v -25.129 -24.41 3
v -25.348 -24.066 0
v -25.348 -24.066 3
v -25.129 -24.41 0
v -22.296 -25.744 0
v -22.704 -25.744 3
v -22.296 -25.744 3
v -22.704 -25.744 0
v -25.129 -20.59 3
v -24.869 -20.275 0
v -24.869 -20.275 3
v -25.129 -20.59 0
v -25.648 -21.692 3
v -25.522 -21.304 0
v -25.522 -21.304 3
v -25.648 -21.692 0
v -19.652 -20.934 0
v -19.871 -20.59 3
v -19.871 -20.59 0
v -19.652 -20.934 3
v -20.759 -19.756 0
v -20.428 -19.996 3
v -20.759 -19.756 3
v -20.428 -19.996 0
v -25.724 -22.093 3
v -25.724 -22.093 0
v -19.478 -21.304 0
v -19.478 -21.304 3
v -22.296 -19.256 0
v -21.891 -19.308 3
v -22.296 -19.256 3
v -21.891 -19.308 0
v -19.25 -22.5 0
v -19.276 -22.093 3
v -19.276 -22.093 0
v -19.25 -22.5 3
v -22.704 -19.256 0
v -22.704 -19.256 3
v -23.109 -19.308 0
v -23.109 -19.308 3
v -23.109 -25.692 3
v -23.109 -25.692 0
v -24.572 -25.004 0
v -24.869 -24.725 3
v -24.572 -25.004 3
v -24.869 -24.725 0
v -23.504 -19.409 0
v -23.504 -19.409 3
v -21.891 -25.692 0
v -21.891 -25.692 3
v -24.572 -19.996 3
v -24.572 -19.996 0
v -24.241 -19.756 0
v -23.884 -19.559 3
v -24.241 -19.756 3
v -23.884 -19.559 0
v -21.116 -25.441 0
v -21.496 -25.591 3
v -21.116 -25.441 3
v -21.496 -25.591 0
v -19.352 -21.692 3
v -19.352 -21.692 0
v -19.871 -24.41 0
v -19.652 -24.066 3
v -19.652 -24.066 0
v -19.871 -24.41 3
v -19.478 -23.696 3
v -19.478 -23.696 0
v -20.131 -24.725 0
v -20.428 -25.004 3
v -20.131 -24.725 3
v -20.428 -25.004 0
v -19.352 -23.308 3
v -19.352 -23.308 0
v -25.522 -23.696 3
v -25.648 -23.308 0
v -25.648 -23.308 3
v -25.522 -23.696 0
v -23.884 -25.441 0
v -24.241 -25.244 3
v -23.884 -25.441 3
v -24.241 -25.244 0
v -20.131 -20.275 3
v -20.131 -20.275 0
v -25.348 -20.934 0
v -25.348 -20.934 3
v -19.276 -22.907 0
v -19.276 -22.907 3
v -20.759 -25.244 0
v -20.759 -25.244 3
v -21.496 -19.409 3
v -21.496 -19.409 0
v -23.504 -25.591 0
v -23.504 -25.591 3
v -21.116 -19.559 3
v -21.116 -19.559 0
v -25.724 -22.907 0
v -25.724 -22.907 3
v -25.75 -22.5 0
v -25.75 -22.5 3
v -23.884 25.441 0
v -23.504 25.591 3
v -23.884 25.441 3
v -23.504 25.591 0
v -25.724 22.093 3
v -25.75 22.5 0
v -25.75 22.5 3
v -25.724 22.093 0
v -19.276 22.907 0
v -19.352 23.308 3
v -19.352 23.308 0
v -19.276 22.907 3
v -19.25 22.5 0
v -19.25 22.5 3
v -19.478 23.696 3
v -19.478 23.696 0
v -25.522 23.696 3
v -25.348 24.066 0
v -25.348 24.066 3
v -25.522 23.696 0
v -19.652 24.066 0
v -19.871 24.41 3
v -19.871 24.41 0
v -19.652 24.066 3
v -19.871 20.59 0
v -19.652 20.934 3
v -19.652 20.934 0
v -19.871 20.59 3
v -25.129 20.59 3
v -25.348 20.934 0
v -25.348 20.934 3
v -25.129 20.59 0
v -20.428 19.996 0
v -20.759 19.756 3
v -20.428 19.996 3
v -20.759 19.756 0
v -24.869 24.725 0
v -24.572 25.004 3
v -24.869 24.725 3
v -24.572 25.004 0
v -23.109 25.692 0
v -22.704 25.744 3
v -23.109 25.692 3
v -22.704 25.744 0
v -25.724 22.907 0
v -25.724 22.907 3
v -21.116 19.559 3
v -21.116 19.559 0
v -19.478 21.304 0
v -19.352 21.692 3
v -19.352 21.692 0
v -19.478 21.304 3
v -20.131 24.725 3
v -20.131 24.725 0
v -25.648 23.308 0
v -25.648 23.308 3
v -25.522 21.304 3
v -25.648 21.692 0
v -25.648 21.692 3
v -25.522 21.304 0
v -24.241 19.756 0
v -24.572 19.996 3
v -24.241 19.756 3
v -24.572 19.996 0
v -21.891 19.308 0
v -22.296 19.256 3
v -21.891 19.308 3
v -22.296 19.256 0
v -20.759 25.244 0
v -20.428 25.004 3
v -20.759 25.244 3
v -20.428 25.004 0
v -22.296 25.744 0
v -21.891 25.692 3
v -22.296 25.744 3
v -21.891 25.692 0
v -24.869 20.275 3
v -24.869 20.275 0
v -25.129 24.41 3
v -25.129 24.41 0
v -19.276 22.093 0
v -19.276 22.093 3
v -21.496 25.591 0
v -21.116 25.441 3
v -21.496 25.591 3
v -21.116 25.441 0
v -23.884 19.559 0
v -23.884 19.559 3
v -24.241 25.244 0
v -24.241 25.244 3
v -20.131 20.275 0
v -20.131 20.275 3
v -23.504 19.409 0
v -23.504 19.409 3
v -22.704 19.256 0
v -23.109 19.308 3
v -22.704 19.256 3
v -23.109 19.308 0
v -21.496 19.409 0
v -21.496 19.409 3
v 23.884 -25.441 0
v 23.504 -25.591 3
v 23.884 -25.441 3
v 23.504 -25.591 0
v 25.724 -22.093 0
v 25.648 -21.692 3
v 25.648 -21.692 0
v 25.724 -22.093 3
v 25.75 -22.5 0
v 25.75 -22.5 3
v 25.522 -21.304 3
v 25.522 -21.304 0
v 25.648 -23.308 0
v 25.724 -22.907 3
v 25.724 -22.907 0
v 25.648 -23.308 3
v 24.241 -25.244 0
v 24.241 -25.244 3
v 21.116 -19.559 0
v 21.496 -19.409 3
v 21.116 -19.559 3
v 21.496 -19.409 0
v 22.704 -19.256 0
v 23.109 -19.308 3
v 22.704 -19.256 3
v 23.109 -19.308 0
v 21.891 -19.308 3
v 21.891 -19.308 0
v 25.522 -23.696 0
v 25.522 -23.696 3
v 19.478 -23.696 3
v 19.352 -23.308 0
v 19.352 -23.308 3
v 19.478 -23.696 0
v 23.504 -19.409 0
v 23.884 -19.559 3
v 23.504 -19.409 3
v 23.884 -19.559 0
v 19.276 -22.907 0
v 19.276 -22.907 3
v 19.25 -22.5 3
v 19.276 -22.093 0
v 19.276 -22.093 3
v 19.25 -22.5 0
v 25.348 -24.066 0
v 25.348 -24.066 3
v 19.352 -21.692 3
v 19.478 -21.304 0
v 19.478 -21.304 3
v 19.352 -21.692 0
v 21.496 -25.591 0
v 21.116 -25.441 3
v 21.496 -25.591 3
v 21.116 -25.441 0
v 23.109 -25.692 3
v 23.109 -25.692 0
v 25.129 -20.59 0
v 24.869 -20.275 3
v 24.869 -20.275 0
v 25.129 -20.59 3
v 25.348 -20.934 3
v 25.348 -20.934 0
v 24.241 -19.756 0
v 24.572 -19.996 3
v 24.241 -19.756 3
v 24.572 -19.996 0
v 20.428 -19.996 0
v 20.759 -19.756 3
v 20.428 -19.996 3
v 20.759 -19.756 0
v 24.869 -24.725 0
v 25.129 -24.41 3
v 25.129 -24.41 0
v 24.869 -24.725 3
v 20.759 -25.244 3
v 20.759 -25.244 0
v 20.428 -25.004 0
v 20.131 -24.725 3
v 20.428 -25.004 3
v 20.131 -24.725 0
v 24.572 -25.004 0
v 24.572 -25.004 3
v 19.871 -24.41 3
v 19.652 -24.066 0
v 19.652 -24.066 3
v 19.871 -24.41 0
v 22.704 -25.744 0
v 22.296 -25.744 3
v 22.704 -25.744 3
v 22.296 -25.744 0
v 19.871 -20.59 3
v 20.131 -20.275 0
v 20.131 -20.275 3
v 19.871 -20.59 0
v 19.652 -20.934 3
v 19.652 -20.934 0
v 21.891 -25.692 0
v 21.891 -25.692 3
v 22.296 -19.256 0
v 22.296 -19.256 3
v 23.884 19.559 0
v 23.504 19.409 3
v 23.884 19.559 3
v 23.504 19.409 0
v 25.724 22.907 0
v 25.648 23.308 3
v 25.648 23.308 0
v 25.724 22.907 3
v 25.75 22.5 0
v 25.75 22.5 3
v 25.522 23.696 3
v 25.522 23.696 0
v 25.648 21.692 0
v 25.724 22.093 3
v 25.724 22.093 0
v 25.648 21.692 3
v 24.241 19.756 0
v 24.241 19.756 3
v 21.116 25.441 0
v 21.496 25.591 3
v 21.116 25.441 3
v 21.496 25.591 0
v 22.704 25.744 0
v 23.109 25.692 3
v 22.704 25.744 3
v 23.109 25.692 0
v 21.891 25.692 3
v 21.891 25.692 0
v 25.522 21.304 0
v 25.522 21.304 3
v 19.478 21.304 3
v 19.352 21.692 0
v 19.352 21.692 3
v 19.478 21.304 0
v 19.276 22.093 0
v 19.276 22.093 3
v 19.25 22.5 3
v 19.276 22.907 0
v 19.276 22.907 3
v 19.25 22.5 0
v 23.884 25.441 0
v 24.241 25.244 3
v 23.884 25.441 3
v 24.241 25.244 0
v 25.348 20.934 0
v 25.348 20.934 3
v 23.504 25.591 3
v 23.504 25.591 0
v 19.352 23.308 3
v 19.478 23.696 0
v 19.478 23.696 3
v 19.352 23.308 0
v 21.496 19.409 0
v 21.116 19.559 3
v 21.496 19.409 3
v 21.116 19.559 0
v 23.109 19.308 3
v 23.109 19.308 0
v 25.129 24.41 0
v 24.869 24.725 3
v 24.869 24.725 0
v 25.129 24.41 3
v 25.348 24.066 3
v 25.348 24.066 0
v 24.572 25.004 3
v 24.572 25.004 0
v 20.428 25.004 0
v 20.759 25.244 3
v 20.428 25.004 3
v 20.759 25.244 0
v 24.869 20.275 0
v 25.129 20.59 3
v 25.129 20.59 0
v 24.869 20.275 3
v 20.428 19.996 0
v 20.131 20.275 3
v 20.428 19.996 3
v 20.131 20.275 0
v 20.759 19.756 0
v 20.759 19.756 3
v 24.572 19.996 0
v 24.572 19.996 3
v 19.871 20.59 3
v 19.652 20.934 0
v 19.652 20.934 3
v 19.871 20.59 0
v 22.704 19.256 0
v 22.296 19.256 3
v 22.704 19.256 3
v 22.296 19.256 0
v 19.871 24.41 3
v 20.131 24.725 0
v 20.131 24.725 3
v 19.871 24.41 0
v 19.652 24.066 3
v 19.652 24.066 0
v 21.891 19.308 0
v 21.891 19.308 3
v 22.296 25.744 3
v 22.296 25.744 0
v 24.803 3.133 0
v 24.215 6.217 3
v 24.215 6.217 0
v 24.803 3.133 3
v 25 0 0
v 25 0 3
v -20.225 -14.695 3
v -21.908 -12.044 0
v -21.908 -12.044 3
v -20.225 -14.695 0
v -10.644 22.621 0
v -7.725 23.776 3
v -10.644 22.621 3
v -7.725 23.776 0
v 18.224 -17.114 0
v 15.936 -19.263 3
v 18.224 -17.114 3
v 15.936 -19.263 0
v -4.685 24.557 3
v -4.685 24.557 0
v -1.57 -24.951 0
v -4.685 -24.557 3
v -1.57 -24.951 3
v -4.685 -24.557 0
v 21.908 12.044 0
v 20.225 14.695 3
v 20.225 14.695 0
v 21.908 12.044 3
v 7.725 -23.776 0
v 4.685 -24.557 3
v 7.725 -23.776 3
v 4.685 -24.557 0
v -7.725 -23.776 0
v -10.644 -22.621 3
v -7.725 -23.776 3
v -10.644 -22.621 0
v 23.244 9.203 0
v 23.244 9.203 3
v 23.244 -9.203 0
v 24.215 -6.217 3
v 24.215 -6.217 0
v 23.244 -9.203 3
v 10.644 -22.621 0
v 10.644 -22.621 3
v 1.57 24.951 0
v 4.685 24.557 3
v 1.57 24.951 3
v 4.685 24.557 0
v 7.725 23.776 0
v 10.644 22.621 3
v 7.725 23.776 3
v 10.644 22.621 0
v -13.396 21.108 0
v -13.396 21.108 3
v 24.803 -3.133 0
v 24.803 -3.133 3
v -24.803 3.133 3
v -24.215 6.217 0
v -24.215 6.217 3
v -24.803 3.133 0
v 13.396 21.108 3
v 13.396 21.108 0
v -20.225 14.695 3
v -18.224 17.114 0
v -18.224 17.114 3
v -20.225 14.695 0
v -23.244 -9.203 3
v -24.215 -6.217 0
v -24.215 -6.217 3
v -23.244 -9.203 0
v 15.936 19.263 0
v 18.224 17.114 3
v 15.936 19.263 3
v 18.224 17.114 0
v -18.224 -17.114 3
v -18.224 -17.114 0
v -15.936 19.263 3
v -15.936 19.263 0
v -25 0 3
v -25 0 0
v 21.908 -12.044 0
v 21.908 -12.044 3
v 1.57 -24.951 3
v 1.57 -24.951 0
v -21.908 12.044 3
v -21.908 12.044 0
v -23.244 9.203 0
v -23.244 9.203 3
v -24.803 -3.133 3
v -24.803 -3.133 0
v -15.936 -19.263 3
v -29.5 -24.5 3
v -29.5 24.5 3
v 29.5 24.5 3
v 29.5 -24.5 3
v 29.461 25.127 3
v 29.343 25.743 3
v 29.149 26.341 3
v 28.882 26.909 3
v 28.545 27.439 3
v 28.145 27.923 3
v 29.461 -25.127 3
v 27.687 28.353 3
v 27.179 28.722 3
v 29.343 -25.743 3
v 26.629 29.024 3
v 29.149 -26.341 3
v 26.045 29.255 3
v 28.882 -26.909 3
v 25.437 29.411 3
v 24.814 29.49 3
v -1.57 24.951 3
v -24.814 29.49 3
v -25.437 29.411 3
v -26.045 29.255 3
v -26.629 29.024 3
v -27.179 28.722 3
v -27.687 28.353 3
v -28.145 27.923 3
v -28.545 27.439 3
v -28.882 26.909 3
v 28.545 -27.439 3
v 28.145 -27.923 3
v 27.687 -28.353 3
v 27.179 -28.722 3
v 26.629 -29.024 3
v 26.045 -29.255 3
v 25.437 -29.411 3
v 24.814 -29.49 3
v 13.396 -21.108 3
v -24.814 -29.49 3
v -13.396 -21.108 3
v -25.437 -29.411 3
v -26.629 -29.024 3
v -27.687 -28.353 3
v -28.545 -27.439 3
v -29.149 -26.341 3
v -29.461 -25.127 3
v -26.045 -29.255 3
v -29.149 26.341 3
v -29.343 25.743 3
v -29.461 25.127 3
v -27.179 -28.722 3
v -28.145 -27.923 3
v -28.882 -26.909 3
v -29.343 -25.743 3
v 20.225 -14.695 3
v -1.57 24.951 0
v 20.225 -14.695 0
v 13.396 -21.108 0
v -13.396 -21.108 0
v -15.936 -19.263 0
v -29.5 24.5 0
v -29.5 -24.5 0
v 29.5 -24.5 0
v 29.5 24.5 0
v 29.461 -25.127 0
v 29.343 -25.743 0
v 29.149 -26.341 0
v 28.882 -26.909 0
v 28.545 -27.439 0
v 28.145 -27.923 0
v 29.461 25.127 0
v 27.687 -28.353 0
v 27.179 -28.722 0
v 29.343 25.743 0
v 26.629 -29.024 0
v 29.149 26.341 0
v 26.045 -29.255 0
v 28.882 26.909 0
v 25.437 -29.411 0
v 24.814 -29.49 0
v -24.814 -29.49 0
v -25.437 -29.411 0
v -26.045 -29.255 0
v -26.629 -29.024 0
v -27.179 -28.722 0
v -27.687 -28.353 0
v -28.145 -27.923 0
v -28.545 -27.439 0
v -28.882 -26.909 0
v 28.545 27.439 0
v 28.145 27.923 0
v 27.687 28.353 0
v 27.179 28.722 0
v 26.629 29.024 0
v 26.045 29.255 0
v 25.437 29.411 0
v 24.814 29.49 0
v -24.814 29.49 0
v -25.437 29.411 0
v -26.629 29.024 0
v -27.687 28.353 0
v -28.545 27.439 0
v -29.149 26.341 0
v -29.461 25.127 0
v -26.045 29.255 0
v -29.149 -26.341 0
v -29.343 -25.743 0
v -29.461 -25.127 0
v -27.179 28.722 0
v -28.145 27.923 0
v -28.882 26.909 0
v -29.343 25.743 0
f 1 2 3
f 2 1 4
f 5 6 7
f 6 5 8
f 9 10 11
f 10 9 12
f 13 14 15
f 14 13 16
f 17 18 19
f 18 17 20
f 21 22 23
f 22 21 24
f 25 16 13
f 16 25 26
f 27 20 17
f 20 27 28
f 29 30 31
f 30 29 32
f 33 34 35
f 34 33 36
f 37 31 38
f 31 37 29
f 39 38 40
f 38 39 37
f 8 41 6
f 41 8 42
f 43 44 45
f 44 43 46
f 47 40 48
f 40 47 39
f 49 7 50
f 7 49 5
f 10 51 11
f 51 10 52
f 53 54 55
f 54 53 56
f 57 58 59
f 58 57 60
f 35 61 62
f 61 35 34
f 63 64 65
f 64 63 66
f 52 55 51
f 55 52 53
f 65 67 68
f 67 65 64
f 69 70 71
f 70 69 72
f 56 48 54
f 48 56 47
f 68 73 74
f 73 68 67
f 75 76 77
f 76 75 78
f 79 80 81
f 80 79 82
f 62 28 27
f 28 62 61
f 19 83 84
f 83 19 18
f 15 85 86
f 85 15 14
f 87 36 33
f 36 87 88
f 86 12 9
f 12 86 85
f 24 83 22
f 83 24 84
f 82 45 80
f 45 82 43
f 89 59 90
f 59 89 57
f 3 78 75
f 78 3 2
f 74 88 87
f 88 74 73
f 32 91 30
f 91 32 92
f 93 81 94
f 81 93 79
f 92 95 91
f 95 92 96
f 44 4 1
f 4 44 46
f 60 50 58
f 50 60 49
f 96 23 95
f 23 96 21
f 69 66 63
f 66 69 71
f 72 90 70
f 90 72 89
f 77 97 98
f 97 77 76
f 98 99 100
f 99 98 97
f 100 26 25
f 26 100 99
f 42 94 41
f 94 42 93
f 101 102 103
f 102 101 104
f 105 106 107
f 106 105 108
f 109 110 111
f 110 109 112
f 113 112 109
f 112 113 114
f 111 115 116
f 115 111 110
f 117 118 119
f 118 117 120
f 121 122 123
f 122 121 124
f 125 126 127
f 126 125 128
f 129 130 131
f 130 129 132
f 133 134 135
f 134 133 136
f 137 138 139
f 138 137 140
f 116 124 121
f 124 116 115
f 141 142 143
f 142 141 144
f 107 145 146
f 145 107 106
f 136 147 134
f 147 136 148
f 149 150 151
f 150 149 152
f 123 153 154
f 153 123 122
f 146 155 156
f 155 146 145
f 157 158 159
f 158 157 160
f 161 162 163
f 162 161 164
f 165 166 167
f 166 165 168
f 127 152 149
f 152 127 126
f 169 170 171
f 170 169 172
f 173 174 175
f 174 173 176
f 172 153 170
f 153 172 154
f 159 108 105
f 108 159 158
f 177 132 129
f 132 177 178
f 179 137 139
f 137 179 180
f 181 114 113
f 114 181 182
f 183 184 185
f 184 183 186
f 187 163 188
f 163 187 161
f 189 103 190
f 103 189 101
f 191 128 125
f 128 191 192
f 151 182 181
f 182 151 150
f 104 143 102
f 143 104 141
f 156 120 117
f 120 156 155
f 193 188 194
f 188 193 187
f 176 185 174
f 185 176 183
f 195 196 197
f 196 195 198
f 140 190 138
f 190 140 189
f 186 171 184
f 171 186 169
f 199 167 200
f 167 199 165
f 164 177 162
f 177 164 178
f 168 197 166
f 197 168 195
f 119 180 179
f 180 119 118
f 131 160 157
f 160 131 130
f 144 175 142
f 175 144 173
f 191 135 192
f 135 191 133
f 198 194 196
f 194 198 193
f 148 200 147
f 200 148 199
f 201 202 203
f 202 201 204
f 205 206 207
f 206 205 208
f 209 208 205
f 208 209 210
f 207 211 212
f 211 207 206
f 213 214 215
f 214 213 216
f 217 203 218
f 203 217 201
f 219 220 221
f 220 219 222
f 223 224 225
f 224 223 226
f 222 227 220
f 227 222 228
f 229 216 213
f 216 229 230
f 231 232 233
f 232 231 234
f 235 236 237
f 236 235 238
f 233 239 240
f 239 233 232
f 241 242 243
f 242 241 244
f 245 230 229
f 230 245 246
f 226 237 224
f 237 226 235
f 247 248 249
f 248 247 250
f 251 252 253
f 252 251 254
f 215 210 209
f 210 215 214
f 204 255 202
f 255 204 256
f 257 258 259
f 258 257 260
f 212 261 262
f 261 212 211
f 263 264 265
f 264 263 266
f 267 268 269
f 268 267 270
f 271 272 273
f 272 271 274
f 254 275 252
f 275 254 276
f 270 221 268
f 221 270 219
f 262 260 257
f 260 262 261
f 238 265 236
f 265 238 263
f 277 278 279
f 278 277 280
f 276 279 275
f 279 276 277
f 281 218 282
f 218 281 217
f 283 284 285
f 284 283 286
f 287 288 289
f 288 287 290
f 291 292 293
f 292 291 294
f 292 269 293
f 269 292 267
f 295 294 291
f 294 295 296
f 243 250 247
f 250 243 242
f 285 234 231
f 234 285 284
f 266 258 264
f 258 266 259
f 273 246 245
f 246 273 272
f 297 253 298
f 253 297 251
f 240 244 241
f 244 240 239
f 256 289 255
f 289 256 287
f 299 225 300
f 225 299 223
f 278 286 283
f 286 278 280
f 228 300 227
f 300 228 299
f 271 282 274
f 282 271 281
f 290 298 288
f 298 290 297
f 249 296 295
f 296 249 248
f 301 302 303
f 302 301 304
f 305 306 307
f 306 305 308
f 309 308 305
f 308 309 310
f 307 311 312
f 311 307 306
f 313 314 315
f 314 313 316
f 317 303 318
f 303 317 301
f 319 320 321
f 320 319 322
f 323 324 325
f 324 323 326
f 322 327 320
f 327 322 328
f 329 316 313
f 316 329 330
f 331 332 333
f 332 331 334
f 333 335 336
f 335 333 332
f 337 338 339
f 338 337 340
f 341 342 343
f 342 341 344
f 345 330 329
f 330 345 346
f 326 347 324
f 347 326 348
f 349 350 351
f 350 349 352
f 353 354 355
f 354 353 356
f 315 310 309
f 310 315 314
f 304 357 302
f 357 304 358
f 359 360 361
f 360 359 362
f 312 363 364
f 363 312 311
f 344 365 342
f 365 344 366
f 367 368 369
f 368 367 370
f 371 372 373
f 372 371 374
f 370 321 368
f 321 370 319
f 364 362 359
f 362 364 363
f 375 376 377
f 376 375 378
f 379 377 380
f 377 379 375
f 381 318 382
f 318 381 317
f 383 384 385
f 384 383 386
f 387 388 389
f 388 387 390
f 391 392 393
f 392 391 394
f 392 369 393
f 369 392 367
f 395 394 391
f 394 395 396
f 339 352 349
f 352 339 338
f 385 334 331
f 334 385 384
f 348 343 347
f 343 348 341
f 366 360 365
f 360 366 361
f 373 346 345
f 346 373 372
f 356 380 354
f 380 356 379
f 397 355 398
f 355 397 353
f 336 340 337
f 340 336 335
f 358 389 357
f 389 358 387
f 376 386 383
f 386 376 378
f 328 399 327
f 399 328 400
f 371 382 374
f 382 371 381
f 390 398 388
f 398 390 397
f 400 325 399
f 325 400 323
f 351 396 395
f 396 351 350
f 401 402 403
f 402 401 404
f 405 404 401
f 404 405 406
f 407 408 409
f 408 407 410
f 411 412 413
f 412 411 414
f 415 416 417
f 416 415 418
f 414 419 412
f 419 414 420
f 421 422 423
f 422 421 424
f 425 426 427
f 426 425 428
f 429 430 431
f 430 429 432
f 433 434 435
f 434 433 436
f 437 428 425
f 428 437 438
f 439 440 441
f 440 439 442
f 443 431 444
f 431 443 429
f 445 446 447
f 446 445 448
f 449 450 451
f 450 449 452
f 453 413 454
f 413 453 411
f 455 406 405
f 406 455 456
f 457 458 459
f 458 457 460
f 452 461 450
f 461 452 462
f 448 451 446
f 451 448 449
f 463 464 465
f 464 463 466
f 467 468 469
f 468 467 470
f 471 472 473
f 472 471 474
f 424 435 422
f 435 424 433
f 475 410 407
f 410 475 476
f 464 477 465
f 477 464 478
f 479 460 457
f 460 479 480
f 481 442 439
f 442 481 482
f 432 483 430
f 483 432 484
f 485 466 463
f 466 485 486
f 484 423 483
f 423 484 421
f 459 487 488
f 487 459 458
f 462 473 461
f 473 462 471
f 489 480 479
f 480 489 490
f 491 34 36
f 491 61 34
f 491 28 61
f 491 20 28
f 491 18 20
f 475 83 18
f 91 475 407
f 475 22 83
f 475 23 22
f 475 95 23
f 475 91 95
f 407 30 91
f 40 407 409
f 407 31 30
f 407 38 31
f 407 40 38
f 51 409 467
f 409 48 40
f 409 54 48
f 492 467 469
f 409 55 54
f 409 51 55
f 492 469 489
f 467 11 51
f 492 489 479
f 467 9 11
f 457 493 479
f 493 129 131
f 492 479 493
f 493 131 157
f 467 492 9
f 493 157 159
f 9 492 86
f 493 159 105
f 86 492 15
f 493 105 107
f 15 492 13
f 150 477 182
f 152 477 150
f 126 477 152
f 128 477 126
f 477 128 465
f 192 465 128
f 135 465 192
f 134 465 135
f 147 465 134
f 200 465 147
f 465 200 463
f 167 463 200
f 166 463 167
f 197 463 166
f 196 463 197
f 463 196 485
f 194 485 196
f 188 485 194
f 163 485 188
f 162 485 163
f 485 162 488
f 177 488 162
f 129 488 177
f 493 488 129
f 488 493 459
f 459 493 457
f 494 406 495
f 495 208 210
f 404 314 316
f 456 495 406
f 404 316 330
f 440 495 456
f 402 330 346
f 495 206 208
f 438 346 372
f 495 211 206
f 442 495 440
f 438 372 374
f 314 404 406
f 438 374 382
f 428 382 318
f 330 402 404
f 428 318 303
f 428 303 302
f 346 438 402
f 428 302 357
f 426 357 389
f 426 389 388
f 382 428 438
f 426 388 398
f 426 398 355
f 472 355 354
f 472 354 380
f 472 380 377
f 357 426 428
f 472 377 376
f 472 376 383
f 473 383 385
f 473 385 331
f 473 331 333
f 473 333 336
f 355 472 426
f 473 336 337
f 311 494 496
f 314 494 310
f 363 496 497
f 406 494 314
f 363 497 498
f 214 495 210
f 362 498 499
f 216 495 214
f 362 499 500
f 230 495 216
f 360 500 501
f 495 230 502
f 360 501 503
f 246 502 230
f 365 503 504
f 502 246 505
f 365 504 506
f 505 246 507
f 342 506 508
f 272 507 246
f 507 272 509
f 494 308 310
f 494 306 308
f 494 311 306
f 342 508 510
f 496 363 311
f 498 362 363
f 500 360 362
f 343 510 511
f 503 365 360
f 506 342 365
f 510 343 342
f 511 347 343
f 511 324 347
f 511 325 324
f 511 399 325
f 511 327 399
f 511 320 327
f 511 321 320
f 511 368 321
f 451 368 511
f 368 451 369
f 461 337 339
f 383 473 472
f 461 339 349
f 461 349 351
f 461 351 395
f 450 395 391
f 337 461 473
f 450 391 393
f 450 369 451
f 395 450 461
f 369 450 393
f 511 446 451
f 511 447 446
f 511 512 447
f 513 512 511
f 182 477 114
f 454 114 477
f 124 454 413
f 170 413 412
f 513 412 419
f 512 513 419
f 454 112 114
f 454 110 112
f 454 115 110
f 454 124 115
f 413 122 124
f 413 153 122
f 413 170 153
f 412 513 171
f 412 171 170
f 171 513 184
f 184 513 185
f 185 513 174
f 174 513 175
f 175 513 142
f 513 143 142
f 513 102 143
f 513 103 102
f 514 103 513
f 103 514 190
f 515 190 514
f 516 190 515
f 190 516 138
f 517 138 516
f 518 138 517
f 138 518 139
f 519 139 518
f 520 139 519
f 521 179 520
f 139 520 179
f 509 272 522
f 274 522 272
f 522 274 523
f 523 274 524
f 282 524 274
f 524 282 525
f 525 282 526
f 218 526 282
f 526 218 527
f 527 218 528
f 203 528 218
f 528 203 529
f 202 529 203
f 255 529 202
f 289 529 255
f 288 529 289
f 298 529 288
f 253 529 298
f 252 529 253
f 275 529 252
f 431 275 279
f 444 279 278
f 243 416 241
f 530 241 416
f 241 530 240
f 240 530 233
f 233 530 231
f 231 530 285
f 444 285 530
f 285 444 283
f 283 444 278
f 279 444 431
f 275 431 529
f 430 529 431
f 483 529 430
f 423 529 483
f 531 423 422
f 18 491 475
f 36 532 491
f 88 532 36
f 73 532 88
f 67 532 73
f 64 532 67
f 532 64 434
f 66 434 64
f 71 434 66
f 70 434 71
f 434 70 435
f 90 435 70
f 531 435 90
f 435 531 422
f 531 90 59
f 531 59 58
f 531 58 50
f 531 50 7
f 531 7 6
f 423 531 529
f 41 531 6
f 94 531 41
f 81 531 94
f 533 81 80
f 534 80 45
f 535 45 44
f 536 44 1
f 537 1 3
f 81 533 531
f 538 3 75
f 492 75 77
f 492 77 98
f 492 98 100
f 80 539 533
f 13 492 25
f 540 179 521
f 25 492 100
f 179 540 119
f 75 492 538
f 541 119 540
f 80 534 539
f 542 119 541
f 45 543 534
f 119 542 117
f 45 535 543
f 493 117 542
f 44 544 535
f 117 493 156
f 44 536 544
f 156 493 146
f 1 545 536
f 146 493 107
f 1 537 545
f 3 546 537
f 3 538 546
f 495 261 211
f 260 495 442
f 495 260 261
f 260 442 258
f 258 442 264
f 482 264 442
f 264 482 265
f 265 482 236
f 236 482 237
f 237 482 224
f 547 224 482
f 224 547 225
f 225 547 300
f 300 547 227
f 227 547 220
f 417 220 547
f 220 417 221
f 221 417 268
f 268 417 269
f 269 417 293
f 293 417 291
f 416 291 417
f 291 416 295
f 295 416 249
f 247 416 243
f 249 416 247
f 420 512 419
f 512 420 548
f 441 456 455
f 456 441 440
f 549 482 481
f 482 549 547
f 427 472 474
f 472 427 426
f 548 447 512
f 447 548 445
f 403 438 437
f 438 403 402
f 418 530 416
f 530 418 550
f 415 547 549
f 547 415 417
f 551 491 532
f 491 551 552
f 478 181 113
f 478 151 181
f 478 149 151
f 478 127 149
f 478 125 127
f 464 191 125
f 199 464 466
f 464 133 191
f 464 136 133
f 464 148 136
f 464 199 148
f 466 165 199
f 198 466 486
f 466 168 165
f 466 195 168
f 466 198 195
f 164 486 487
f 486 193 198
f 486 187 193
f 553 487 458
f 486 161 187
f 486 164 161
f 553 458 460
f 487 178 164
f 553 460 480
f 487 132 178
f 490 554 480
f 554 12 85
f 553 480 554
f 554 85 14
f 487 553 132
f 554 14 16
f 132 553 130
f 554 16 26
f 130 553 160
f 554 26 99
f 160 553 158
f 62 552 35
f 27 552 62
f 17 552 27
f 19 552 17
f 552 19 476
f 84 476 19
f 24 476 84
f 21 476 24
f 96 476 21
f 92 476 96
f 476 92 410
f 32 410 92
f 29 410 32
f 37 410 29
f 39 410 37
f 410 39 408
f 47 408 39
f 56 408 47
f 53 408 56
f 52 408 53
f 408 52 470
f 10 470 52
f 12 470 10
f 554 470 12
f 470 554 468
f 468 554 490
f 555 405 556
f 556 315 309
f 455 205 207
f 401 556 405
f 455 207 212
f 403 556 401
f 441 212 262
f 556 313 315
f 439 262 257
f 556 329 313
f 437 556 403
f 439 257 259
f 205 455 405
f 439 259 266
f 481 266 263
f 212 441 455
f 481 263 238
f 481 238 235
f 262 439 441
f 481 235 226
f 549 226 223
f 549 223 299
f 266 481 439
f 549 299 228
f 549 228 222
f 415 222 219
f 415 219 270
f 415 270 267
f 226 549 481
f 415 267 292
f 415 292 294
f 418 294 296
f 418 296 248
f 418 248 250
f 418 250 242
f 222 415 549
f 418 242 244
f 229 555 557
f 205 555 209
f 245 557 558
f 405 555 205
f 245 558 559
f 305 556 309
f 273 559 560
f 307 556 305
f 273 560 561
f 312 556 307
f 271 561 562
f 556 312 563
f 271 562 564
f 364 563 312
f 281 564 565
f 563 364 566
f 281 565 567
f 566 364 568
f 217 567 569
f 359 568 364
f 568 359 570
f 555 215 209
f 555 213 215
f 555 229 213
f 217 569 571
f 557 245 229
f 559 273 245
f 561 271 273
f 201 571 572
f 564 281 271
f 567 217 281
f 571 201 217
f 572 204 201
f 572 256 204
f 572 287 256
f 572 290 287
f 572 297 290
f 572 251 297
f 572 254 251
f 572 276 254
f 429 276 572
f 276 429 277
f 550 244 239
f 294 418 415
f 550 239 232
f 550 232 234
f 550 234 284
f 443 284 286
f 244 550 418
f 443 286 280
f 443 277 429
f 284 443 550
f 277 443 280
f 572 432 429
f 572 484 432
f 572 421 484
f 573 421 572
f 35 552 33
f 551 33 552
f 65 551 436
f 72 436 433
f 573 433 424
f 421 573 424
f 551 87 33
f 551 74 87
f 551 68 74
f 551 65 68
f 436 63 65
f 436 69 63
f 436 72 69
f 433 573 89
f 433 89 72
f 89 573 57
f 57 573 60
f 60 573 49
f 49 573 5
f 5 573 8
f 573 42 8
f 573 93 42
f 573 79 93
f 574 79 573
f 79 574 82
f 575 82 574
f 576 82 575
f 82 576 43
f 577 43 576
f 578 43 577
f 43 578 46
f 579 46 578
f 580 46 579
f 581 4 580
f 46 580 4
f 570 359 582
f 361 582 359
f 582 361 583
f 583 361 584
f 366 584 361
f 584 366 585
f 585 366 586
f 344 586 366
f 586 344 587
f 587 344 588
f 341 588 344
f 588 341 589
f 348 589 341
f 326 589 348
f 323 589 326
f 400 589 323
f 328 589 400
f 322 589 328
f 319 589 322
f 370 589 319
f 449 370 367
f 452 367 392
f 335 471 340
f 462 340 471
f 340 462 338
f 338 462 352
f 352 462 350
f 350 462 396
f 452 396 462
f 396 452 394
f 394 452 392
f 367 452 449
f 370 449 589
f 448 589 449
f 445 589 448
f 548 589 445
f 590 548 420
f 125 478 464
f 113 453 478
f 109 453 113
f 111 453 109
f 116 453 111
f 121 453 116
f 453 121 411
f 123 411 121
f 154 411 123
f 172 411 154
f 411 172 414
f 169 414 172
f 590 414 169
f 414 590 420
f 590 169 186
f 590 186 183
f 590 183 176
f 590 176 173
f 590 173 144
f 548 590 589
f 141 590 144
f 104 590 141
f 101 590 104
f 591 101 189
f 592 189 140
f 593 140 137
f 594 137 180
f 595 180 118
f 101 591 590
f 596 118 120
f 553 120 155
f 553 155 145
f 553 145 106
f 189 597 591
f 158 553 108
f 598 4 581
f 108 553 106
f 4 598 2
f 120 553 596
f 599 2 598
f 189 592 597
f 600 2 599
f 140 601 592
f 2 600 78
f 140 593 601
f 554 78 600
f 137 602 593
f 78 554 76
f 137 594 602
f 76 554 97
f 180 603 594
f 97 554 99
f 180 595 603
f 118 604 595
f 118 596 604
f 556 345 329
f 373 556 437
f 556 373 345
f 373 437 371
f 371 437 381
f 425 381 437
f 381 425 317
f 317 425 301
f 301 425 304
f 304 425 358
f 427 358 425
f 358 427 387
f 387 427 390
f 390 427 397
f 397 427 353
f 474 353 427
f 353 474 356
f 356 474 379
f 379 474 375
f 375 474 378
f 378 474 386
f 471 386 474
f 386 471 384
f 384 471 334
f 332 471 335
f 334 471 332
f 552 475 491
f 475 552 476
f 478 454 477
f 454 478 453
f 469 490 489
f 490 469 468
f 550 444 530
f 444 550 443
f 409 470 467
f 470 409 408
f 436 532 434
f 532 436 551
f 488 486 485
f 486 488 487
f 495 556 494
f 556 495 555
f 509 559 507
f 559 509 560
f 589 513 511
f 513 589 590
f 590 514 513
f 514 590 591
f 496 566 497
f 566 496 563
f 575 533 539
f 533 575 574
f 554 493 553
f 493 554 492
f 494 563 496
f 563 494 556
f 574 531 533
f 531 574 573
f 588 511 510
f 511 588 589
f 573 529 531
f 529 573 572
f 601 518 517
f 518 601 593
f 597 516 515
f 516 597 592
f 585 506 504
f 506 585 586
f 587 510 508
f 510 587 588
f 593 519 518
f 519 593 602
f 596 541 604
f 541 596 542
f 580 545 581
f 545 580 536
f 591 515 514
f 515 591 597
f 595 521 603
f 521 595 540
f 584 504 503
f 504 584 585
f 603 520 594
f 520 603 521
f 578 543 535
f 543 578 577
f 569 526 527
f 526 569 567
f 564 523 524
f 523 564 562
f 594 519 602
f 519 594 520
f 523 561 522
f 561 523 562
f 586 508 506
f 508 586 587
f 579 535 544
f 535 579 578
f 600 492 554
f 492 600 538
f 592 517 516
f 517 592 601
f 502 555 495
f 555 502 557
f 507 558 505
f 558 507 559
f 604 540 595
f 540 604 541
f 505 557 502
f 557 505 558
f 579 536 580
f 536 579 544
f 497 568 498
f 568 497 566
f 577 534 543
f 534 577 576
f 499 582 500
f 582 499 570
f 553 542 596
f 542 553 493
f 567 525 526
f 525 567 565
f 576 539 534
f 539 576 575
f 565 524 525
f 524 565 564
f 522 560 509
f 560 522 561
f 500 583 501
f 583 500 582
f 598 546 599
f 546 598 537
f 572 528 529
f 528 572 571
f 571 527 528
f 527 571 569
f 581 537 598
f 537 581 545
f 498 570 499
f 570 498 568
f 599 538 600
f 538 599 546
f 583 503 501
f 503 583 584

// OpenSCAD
$fn = 50;


difference() {
	union() {
		hull() {
			translate(v = [-24.5000000000, 24.5000000000, 0]) {
				cylinder(h = 3, r = 5);
			}
			translate(v = [24.5000000000, 24.5000000000, 0]) {
				cylinder(h = 3, r = 5);
			}
			translate(v = [-24.5000000000, -24.5000000000, 0]) {
				cylinder(h = 3, r = 5);
			}
			translate(v = [24.5000000000, -24.5000000000, 0]) {
				cylinder(h = 3, r = 5);
			}
		}
	}
	union() {
		#translate(v = [-22.5000000000, -22.5000000000, -100.0000000000]) {
			cylinder(h = 200, r = 3.2500000000);
		}
		#translate(v = [-22.5000000000, 22.5000000000, -100.0000000000]) {
			cylinder(h = 200, r = 3.2500000000);
		}
		#translate(v = [22.5000000000, -22.5000000000, -100.0000000000]) {
			cylinder(h = 200, r = 3.2500000000);
		}
		#translate(v = [22.5000000000, 22.5000000000, -100.0000000000]) {
			cylinder(h = 200, r = 3.2500000000);
		}
		#cylinder(h = 3, r = 25.0000000000);
	}
}
